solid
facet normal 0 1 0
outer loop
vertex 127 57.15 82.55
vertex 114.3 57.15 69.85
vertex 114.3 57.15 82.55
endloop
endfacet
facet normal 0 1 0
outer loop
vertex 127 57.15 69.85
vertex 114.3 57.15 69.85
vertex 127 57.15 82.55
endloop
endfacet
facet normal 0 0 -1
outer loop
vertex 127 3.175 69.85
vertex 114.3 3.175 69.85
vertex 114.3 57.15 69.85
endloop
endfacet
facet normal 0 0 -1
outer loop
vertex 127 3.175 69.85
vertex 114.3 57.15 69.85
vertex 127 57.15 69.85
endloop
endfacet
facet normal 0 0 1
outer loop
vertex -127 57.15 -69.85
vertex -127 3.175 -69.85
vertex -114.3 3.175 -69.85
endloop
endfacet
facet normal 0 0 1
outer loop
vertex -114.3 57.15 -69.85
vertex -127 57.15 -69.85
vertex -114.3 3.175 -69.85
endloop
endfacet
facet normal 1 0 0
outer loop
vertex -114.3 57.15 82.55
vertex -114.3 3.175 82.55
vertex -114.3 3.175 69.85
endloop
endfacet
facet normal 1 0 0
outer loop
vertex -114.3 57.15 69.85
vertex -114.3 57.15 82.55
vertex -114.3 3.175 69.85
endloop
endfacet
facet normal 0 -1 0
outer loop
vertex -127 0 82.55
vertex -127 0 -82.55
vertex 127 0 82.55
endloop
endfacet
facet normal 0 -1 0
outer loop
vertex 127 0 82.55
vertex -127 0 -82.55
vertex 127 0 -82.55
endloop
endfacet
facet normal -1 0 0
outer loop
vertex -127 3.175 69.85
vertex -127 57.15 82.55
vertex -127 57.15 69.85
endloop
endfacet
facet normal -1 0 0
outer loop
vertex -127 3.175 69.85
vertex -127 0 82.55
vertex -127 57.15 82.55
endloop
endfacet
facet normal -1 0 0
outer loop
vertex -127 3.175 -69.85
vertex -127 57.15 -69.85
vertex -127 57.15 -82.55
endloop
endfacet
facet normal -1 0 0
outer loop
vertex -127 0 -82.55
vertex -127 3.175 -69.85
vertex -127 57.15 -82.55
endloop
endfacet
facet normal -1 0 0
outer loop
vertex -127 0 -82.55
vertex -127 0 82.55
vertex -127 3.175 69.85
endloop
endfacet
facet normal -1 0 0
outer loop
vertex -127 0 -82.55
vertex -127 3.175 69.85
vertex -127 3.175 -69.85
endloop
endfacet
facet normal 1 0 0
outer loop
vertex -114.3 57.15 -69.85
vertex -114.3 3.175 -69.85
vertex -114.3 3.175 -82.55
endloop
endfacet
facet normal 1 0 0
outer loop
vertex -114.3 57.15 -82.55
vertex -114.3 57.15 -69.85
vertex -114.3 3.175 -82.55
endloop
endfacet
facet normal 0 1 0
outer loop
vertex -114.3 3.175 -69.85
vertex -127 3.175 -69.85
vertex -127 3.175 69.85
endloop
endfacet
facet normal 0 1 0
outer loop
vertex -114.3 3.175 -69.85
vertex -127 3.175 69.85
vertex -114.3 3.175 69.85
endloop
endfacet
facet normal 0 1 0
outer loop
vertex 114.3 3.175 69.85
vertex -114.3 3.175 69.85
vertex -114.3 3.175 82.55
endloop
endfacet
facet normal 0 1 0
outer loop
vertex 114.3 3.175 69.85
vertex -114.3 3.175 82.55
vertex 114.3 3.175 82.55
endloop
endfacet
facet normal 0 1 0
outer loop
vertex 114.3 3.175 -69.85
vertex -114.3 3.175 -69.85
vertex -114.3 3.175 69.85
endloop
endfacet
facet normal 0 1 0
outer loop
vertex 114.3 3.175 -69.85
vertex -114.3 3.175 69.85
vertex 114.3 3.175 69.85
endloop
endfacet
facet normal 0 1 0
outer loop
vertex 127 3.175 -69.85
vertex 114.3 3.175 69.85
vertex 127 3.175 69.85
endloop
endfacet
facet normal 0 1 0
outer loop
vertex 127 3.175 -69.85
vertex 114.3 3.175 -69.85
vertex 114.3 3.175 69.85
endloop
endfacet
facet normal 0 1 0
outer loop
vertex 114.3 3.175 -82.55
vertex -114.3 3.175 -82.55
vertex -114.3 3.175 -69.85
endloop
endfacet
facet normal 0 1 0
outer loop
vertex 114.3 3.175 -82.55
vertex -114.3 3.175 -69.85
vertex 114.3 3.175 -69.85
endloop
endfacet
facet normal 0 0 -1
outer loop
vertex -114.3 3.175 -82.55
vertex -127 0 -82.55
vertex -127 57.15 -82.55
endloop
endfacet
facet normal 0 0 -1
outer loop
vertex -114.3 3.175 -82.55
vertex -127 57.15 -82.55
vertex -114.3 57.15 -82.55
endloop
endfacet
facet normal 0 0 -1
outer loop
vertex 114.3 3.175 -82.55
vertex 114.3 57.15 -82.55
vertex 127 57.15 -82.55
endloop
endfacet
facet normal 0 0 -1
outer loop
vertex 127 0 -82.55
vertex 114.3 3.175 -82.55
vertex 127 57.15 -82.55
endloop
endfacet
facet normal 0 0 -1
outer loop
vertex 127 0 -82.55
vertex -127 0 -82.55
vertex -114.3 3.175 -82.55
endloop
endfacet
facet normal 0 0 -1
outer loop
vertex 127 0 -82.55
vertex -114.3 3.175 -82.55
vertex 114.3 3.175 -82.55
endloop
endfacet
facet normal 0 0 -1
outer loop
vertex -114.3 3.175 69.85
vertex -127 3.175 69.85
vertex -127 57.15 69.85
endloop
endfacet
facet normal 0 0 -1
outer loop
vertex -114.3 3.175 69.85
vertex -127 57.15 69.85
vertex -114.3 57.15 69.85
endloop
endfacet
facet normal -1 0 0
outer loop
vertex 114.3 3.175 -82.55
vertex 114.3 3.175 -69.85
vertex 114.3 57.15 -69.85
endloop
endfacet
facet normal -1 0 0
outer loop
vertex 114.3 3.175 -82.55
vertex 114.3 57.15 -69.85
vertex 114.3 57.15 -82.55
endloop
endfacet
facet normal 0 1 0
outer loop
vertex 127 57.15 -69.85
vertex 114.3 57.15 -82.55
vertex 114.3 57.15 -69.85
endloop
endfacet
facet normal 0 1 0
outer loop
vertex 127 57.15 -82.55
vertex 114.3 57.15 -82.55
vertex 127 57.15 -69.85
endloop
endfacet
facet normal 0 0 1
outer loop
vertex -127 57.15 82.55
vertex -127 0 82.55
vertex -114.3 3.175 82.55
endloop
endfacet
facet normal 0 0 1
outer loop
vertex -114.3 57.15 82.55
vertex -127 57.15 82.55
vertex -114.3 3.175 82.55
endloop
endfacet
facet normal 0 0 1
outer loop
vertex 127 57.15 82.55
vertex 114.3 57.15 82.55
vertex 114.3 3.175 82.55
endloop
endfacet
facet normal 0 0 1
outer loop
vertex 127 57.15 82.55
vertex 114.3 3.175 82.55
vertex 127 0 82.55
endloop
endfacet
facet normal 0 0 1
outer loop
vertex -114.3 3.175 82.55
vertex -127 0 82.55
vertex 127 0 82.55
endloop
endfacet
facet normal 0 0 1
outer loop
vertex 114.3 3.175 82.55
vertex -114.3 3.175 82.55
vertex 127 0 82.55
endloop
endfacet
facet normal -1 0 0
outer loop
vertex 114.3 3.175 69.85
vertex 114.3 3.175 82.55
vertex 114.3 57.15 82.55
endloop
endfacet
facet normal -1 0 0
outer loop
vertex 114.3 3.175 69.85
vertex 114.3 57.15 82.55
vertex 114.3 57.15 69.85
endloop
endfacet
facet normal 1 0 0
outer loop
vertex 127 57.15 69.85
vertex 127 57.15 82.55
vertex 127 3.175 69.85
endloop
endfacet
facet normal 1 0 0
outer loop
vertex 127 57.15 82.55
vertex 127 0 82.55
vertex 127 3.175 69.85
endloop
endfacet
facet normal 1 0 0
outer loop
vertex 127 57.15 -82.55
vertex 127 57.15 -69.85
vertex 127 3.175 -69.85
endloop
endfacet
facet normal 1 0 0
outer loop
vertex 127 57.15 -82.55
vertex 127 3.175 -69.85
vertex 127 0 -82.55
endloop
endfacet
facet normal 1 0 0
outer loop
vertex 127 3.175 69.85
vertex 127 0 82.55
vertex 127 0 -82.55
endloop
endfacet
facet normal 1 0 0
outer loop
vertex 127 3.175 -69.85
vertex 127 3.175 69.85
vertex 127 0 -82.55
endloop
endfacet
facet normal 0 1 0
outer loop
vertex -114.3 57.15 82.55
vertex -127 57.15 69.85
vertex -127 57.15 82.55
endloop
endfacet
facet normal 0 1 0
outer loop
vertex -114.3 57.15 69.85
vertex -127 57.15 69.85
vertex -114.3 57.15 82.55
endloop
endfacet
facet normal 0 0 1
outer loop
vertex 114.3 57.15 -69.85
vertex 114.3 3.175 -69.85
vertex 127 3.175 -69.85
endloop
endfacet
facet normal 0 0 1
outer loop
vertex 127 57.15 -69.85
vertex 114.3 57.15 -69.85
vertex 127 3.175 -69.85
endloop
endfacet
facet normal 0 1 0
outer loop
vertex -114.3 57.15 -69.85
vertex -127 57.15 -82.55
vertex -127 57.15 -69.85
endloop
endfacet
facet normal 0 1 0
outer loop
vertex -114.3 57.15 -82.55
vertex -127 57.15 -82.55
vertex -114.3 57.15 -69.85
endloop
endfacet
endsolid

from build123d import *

# Parameters (mm, degrees)
SKETCH2_W            = 254
SKETCH2_H            = 165.1
BOSS_EXTRUDE1_DEPTH  = 3.175
SKETCH3_W            = 12.7
SKETCH3_H            = 12.7
BOSS_EXTRUDE2_DEPTH  = 53.975
LPATTERN1_COUNT      = 2
LPATTERN1_PITCH      = 152.4
LPATTERN1_COUNT_DIR2 = 2
LPATTERN1_PITCH_DIR2 = 241.3


with BuildPart() as part:
    # Sketch2 → Boss-Extrude1 (new body)
    with BuildSketch(Plane(origin=(0, 0, 0), x_dir=(1, 0, 0), z_dir=(0, 1, 0))):
        Rectangle(SKETCH2_W, SKETCH2_H)
    extrude(amount=BOSS_EXTRUDE1_DEPTH)

    # Sketch3 → Boss-Extrude2 (add)
    with BuildSketch(Plane(origin=(0, 3.175, 0), x_dir=(1, 0, 0), z_dir=(0, 1, 0))):
        with Locations((-120.65, -76.2)):
            Rectangle(SKETCH3_W, SKETCH3_H)
    boss_extrude2 = extrude(amount=BOSS_EXTRUDE2_DEPTH)

    # LPattern1: Boss-Extrude2 2 × 2
    with Locations(*[(j * LPATTERN1_PITCH_DIR2, 0, -i * LPATTERN1_PITCH) for i in range(LPATTERN1_COUNT) for j in range(LPATTERN1_COUNT_DIR2) if (i, j) != (0, 0)]):
        add(boss_extrude2)


solid = part.part
